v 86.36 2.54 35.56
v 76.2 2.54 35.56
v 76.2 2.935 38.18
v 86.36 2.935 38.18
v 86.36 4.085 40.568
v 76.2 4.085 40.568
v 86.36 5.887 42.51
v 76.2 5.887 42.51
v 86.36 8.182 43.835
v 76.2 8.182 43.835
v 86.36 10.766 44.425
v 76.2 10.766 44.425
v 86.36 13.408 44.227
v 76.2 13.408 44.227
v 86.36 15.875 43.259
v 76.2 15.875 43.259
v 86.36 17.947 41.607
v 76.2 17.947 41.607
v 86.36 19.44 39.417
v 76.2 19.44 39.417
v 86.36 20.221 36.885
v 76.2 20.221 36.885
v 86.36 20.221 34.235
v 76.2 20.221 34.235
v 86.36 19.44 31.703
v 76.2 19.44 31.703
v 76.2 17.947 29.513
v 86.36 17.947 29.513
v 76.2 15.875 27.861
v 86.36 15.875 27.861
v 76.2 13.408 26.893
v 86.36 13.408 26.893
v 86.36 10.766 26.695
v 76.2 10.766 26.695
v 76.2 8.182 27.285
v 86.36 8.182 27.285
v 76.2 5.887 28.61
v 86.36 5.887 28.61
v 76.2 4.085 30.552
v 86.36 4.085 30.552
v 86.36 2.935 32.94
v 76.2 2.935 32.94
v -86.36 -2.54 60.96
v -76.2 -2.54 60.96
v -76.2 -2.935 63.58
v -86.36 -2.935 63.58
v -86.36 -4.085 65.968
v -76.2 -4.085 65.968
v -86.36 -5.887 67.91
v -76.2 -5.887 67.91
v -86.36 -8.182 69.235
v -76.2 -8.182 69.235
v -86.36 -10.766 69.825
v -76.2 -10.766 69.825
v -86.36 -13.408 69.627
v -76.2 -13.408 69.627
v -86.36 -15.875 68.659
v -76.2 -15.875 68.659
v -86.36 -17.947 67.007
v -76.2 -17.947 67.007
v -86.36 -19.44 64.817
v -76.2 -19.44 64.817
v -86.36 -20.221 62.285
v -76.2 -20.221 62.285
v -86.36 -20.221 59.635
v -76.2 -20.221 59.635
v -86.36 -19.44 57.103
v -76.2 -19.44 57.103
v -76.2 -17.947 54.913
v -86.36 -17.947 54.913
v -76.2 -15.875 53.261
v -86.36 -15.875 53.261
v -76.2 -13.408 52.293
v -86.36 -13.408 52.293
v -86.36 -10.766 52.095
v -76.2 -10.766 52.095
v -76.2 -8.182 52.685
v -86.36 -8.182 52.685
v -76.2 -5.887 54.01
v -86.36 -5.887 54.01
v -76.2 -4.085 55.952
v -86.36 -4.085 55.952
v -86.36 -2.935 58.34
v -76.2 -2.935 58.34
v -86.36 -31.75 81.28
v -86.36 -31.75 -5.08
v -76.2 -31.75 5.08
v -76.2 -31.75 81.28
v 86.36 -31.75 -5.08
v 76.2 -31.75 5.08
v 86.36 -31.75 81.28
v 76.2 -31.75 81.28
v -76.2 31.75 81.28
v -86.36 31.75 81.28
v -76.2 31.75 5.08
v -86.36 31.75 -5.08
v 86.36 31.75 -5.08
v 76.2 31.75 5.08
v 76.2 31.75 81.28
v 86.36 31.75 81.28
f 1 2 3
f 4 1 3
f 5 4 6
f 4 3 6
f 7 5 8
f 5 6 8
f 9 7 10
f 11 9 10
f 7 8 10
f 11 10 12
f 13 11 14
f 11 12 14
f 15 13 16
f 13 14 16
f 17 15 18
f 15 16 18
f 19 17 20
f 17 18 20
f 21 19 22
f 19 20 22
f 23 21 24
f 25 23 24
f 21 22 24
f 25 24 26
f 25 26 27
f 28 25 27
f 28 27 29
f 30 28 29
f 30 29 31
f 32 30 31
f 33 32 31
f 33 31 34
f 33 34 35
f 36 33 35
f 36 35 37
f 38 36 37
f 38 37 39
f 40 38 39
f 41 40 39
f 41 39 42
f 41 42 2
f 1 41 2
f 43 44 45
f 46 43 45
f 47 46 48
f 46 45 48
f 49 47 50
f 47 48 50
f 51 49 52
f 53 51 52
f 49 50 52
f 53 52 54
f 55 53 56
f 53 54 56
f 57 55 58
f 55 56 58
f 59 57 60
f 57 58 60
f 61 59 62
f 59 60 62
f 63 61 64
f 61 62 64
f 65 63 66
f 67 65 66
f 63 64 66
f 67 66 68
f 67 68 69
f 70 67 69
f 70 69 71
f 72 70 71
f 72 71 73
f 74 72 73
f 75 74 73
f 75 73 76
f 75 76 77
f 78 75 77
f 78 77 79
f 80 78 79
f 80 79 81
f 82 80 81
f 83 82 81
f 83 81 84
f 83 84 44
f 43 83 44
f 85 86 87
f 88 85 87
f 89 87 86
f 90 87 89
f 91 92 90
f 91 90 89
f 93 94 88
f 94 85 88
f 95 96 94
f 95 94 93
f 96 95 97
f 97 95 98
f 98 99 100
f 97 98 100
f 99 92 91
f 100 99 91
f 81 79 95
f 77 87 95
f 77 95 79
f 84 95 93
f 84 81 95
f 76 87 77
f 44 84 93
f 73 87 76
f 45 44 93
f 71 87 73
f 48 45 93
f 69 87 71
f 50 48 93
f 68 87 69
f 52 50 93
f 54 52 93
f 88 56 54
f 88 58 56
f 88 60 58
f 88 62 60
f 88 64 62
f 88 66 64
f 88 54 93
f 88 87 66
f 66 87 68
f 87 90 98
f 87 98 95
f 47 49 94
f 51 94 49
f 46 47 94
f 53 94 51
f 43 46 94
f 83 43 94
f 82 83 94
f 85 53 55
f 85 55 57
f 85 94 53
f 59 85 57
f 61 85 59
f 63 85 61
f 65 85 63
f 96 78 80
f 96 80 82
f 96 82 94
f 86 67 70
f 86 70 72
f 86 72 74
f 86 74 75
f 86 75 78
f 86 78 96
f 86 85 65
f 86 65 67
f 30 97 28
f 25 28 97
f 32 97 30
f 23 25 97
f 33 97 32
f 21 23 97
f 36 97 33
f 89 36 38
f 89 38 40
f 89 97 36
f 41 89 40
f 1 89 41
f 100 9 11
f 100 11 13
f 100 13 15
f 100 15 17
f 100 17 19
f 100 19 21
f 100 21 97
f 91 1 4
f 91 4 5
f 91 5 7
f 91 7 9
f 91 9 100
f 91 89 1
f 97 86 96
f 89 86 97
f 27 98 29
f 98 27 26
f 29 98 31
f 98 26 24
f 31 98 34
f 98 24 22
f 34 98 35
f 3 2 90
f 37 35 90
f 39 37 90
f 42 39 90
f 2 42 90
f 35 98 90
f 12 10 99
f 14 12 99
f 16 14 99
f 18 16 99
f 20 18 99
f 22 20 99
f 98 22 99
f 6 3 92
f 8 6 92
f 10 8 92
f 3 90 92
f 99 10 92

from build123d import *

# Parameters (mm, degrees)
F0_W     = 10.16
F0_H     = 76.2
F1_DEPTH = 31.75
F3_D     = 17.78
F3_DEPTH = 12.7
F5_D     = 17.78
F5_DEPTH = 12.7


with BuildPart() as f1:
    # F0 (on Front) → F1 (new body, symmetric)
    with BuildSketch(Plane.XZ):
        with Locations((-81.28, 43.18)):
            Rectangle(F0_W, F0_H)
        with Locations((81.28, 43.18)):
            Rectangle(F0_W, F0_H)
        Polygon((-76.2, 5.08), (-86.36, 5.08), (-86.36, -5.08), (86.36, -5.08), (86.36, 5.08), (76.2, 5.08), align=None)
    extrude(amount=F1_DEPTH, both=True)

    # F3
    with Locations(Plane.YZ.offset(86.36)):
        with Locations((11.43, 35.56)):
            Hole(F3_D / 2, depth=F3_DEPTH)

    # F5
    with Locations(Plane(origin=(-86.36, 0, 0), x_dir=(0, -1, 0), z_dir=(-1, 0, 0))):
        with Locations((11.43, 60.96)):
            Hole(F5_D / 2, depth=F5_DEPTH)


solid = f1.part
